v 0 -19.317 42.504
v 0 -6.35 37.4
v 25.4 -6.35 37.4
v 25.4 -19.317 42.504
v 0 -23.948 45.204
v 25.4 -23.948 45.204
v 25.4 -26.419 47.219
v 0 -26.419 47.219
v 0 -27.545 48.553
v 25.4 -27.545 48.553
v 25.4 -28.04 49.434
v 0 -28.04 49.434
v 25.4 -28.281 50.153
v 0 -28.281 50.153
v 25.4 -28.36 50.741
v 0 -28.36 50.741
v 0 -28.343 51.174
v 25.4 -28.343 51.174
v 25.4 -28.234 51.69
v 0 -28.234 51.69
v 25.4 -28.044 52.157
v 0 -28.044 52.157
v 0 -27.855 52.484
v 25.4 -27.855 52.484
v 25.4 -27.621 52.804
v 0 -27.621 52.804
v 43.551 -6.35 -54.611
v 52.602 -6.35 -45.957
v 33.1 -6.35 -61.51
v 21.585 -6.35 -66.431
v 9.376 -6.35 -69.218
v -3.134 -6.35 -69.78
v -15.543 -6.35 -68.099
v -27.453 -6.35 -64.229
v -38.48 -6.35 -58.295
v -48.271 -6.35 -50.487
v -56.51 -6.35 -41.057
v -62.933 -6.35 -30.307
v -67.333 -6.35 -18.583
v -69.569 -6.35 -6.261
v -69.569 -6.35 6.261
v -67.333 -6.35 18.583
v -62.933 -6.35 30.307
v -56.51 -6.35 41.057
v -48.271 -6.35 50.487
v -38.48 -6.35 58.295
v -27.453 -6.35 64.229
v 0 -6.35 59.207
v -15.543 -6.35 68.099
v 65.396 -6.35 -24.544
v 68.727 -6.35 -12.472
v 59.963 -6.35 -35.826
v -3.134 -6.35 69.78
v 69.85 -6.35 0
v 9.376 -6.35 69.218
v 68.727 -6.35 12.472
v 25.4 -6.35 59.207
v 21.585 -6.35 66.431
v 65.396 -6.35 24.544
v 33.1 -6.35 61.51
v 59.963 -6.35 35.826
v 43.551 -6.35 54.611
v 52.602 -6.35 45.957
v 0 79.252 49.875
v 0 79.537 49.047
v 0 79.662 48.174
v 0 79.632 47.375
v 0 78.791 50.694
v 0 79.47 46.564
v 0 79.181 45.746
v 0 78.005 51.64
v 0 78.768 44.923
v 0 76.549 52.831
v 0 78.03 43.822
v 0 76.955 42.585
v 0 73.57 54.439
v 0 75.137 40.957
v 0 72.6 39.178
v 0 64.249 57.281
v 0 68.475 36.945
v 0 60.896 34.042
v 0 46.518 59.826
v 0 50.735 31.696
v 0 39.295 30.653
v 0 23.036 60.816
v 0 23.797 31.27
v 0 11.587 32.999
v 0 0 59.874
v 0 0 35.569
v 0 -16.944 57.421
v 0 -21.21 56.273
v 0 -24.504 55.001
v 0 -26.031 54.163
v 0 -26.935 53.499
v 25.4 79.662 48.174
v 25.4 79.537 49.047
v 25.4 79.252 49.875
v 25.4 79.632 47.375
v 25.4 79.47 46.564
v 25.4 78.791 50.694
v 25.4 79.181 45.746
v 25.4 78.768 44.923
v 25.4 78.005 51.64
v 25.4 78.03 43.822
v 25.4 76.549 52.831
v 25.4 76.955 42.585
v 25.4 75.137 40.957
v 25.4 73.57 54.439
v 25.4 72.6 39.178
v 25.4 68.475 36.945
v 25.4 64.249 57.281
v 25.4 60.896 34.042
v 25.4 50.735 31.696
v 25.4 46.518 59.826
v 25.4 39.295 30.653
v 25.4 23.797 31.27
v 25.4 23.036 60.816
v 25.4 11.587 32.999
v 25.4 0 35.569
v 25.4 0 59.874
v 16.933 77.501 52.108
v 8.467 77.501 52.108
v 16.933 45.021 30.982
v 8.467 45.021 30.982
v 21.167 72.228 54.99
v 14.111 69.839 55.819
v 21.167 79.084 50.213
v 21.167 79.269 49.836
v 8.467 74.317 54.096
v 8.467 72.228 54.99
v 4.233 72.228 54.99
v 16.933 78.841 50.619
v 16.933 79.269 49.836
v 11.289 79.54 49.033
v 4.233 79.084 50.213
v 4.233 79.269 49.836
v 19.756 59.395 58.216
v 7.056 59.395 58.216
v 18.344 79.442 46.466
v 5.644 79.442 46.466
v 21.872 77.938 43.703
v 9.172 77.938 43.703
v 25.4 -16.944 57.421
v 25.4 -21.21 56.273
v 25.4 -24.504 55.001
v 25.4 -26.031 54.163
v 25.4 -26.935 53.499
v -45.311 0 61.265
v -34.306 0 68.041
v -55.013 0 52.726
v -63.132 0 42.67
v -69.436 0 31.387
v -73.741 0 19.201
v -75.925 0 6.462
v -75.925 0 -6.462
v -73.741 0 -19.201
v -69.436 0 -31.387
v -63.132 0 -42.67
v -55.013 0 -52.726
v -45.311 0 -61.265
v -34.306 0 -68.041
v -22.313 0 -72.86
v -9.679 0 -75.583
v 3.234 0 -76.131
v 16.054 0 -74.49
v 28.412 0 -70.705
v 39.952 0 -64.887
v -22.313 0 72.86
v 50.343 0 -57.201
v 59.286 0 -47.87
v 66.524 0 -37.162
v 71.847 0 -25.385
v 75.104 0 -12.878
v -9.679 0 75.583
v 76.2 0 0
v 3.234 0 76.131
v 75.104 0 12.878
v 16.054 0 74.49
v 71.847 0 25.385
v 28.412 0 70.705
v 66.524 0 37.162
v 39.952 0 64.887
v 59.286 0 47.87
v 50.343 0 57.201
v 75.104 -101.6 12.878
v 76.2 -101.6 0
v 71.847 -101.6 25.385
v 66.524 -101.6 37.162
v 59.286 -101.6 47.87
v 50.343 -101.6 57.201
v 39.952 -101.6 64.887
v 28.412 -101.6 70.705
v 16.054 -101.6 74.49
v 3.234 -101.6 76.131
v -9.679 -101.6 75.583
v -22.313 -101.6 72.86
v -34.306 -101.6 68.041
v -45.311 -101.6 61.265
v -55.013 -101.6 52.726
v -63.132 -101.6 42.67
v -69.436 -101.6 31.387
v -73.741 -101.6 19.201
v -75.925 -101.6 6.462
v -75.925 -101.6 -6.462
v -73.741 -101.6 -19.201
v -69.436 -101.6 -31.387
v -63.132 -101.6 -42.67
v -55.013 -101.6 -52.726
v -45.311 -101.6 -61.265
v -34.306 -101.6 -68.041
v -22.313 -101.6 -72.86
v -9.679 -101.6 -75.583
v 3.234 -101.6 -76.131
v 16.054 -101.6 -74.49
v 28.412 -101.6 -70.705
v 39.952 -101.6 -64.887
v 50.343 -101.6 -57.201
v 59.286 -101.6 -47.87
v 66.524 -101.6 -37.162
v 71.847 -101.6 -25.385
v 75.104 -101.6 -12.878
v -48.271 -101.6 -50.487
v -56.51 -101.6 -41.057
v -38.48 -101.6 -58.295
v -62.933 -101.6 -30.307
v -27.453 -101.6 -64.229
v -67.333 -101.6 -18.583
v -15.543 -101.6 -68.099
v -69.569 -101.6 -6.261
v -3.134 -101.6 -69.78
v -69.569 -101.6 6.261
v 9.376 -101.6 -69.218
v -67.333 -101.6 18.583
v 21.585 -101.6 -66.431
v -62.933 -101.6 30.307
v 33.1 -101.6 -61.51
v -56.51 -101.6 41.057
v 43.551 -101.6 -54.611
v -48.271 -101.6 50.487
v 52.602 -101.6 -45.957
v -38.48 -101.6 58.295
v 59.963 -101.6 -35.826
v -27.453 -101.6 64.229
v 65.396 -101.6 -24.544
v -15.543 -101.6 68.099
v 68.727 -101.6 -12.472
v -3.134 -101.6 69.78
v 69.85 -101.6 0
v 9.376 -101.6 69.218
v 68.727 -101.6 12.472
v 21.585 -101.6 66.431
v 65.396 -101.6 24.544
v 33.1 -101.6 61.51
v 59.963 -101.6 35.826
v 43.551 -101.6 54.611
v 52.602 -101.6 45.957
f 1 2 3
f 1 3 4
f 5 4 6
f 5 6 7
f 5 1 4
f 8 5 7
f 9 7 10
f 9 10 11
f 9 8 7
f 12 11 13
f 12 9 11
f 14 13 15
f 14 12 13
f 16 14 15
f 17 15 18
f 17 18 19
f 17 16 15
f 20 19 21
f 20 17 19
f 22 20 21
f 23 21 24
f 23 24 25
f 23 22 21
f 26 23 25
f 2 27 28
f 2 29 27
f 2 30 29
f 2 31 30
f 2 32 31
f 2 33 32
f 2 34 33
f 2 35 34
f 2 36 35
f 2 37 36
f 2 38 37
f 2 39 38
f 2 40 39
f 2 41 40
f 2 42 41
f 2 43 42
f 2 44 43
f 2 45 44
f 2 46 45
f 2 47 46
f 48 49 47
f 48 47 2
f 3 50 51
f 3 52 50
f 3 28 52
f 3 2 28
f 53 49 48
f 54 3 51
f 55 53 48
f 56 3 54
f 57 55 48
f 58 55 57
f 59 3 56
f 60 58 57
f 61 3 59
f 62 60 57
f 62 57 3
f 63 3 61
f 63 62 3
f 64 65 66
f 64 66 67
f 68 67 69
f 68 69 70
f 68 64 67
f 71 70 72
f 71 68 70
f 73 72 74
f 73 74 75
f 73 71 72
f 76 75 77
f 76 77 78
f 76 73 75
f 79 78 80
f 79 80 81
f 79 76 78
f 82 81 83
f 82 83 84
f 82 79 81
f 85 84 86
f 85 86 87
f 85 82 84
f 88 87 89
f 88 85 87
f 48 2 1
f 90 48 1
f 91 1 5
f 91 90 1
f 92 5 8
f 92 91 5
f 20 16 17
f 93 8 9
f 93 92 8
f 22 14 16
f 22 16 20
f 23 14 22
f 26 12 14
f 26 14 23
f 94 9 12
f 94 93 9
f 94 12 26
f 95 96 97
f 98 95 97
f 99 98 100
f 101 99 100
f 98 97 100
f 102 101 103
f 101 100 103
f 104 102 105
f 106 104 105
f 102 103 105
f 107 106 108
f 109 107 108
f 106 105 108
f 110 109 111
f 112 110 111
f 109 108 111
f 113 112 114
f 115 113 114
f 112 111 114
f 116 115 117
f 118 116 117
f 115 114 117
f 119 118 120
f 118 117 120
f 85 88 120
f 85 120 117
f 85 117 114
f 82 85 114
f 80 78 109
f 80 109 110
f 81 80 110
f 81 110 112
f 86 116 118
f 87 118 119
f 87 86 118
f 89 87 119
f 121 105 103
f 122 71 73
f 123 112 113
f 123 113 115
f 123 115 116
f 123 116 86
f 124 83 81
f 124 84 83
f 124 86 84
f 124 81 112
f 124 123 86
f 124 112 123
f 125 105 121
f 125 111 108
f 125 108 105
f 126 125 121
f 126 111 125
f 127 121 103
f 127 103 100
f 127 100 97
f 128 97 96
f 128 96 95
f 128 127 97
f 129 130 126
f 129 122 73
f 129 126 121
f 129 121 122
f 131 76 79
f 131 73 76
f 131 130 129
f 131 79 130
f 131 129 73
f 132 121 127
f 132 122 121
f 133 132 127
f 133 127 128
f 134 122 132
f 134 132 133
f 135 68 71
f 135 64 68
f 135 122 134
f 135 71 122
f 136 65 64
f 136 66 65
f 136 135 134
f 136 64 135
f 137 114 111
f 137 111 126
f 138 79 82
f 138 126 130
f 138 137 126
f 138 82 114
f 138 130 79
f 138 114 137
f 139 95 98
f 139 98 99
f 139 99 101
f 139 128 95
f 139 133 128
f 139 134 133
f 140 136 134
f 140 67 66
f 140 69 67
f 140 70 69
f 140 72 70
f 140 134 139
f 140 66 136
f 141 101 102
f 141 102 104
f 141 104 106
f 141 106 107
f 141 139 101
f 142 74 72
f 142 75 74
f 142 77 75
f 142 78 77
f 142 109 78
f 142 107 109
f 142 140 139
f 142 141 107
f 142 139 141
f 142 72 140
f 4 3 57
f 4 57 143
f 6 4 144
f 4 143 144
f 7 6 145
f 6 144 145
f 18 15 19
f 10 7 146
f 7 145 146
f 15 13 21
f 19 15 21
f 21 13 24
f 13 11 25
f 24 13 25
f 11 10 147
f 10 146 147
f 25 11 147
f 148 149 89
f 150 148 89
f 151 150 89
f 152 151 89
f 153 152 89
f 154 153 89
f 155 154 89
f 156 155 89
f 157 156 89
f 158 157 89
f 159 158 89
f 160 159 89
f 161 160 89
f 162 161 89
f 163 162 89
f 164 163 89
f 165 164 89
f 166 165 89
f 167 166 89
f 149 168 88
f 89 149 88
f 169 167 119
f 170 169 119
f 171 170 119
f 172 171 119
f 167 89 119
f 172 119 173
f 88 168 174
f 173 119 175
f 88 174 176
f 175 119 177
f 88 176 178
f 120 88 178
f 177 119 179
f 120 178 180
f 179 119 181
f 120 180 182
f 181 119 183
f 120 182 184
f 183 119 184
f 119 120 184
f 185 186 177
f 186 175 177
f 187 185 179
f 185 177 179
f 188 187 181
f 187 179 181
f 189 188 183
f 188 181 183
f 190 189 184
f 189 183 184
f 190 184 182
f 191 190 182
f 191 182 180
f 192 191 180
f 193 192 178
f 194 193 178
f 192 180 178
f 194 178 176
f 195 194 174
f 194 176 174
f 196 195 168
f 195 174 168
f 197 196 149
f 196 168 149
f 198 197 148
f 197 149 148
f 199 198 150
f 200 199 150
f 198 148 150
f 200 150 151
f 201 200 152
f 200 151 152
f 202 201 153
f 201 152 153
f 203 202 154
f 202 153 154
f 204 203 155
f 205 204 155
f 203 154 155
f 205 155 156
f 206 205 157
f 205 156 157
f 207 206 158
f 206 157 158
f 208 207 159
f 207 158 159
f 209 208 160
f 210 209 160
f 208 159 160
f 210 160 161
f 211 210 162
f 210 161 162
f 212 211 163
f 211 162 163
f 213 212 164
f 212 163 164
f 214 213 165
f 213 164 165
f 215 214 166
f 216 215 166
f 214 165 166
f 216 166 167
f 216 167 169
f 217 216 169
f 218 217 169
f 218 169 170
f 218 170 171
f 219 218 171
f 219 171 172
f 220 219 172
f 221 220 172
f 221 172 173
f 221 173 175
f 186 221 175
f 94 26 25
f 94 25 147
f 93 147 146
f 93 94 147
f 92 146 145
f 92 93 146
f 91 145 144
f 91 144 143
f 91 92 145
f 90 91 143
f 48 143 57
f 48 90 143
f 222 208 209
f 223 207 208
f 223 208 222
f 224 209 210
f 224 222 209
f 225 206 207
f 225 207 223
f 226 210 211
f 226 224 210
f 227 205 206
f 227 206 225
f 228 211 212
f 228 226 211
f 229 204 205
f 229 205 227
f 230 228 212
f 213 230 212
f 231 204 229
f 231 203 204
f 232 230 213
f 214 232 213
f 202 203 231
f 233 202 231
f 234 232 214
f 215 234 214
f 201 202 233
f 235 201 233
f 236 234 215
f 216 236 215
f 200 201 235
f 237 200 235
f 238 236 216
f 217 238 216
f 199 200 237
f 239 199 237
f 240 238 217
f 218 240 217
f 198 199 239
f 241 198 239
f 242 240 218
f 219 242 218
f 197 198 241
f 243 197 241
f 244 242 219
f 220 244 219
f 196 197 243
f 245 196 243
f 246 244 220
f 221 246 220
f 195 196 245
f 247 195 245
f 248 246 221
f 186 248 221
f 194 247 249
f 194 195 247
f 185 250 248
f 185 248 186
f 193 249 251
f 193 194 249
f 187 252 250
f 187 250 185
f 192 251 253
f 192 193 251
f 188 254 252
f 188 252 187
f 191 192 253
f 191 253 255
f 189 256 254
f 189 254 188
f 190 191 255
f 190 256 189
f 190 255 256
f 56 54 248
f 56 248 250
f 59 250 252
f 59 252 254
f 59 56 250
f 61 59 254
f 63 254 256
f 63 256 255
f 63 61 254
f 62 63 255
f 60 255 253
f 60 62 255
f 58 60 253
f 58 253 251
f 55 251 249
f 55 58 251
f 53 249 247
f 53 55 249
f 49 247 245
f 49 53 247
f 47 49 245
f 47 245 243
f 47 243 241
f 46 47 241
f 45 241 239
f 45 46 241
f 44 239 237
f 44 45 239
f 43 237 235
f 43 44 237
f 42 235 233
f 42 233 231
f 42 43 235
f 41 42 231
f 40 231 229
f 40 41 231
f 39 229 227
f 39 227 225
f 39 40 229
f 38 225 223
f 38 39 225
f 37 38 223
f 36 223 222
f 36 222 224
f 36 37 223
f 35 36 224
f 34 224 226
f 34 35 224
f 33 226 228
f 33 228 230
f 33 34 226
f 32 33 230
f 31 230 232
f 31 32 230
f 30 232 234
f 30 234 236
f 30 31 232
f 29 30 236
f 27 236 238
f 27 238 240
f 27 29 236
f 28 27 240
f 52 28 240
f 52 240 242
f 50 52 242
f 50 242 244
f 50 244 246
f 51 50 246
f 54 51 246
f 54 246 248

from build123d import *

# Parameters (mm, degrees)
F0_R     = 76.2
F0_R_2   = 69.85
F1_DEPTH = 25.4
F2_DEPTH = 76.2
F3_R     = 70.0511515775
F4_DEPTH = 6.35
F6_DEPTH = 25.4


with BuildPart() as f1:
    # F0 (on Front) → F1 (new body)
    with BuildSketch(Plane.XZ):
        Circle(F0_R)
        Circle(F0_R_2, mode=Mode.SUBTRACT)
    extrude(amount=F1_DEPTH)

    # F2 (add): a face of the model
    f2_faces = [f1.faces().sort_by_distance(p)[0] for p in [
        (-74.0447385309, -25.4, 0),
    ]]
    extrude(f2_faces, amount=F2_DEPTH)

    # F3 (on Front) → F4 (join)
    with BuildSketch(Plane.XZ):
        Circle(F3_R)
    extrude(amount=F4_DEPTH)

    # F5 (on Right) → F6 (join)
    with BuildSketch(Plane.YZ):
        with BuildLine():
            add(Edge.make_bspline(
                [(-27.6209320873, 52.8044328094), (-19.1718805943, 63.260073286), (113.9909728332, 64.3613693038), (44.95583544, 16.606444594), (-34.7977200102, 43.9232093535), (-27.6209320873, 52.8044328094)],
                knots=[0, 0, 0, 0, 0.4070795235, 0.6542187711, 1, 1, 1, 1], degree=3))
        make_face()
    extrude(amount=F6_DEPTH)


solid = f1.part
